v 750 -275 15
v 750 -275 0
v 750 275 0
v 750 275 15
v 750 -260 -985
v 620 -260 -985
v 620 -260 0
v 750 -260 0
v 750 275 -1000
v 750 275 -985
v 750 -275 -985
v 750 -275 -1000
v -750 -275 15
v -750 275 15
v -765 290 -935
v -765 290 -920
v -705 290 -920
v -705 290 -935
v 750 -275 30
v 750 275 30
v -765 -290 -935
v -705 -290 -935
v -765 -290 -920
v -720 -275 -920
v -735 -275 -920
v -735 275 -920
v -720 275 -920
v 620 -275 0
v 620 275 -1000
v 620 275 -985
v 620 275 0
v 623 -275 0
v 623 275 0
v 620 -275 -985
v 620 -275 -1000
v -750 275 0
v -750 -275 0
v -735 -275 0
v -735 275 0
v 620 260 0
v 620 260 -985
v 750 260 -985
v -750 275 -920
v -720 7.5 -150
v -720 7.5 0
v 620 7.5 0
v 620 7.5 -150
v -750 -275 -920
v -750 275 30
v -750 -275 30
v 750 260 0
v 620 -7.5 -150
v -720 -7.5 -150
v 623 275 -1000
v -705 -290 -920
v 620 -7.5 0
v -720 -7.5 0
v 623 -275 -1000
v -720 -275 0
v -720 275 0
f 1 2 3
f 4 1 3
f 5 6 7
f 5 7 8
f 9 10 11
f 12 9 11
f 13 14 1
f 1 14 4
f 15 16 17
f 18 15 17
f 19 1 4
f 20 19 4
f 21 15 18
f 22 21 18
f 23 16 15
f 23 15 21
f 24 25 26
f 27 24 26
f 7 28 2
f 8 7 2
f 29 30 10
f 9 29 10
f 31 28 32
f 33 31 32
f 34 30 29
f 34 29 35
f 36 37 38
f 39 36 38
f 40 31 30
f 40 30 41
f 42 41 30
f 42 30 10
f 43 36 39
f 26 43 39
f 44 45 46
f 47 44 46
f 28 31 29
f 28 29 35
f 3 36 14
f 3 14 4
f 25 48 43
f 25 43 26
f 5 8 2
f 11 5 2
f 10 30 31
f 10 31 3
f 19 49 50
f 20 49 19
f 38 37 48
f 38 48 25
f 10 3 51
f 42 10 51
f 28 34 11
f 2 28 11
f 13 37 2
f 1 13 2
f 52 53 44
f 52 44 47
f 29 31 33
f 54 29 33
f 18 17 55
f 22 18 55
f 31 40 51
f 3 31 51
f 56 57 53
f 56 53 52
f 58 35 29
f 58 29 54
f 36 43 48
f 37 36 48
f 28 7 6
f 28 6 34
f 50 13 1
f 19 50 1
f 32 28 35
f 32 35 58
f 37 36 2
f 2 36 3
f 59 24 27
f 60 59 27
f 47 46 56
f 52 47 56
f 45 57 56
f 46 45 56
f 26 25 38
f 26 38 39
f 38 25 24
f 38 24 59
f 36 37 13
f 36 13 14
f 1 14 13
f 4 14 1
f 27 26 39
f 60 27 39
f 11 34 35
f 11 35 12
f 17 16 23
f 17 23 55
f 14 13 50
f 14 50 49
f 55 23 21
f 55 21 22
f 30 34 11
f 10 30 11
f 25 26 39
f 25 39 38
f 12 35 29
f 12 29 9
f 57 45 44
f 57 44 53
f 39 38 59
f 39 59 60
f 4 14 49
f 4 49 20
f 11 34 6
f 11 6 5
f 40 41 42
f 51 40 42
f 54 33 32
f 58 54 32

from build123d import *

# Parameters (mm, degrees)
F0_W      = 1500
F0_H      = 550
F1_DEPTH  = 15
F1_FACE_W = 1500
F1_FACE_H = 550
F2_DEPTH  = 15
F3_W      = 15
F3_H      = 550
F4_DEPTH  = 920
F4_FACE_W = 550
F4_FACE_H = 920
F5_DEPTH  = 15
F6_W      = 130
F6_H      = 15
F7_DEPTH  = 985
F8_W      = 130
F8_H      = 550
F9_DEPTH  = 15
F10_W     = 3
F10_H     = 550
F11_DEPTH = 1000
F12_W     = 1340
F12_H     = 15
F13_DEPTH = 150
F14_W     = 60
F14_H     = 580
F15_DEPTH = 15


with BuildPart() as f1:
    # F0 (on Top) → F1 (new body)
    with BuildSketch(Plane.XY):
        Rectangle(F0_W, F0_H)
    extrude(amount=F1_DEPTH)


with BuildPart() as f2:
    # F1_face (on face) → F2 (new body)
    with BuildSketch(Plane.XY.offset(15)):
        Rectangle(F1_FACE_W, F1_FACE_H)
    extrude(amount=F2_DEPTH)


with BuildPart() as f4:
    # F3 (on face) → F4 (new body)
    with BuildSketch(Plane(origin=(0, 0, 0), x_dir=(1, 0, 0), z_dir=(0, 0, -1))):
        with Locations((-742.5, 0)):
            Rectangle(F3_W, F3_H)
    extrude(amount=F4_DEPTH)


with BuildPart() as f5:
    # F4_face (on face) → F5 (new body)
    with BuildSketch(Plane(origin=(-735, 0, -460), x_dir=(0, 1, 0), z_dir=(1, 0, 0))):
        Rectangle(F4_FACE_W, F4_FACE_H)
    extrude(amount=F5_DEPTH)


with BuildPart() as f7:
    # F6 (on face) → F7 (new body)
    with BuildSketch(Plane(origin=(0, 0, 0), x_dir=(1, 0, 0), z_dir=(0, 0, -1))):
        with Locations((685, 267.5)):
            Rectangle(F6_W, F6_H)
        with Locations((685, -267.5)):
            Rectangle(F6_W, F6_H)
    extrude(amount=F7_DEPTH)


with BuildPart() as f9:
    # F8 (on face) → F9 (new body)
    with BuildSketch(Plane(origin=(0, 0, -985), x_dir=(1, 0, 0), z_dir=(0, 0, -1))):
        with Locations((685, 0)):
            Rectangle(F8_W, F8_H)
    extrude(amount=F9_DEPTH)


with BuildPart() as f11:
    # F10 (on face) → F11 (new body)
    with BuildSketch(Plane(origin=(0, 0, 0), x_dir=(1, 0, 0), z_dir=(0, 0, -1))):
        with Locations((621.5, 0)):
            Rectangle(F10_W, F10_H)
    extrude(amount=F11_DEPTH)


with BuildPart() as f13:
    # F12 (on face) → F13 (new body)
    with BuildSketch(Plane(origin=(0, 0, 0), x_dir=(1, 0, 0), z_dir=(0, 0, -1))):
        with Locations((-50, 0)):
            Rectangle(F12_W, F12_H)
    extrude(amount=F13_DEPTH)


with BuildPart() as f15:
    # F14 (on face) → F15 (new body)
    with BuildSketch(Plane(origin=(0, 0, -920), x_dir=(1, 0, 0), z_dir=(0, 0, -1))):
        with Locations((-735, 0)):
            Rectangle(F14_W, F14_H)
    extrude(amount=F15_DEPTH)


solid = Compound([f1.part, f2.part, f4.part, f5.part, f7.part, f9.part, f11.part, f13.part, f15.part])
